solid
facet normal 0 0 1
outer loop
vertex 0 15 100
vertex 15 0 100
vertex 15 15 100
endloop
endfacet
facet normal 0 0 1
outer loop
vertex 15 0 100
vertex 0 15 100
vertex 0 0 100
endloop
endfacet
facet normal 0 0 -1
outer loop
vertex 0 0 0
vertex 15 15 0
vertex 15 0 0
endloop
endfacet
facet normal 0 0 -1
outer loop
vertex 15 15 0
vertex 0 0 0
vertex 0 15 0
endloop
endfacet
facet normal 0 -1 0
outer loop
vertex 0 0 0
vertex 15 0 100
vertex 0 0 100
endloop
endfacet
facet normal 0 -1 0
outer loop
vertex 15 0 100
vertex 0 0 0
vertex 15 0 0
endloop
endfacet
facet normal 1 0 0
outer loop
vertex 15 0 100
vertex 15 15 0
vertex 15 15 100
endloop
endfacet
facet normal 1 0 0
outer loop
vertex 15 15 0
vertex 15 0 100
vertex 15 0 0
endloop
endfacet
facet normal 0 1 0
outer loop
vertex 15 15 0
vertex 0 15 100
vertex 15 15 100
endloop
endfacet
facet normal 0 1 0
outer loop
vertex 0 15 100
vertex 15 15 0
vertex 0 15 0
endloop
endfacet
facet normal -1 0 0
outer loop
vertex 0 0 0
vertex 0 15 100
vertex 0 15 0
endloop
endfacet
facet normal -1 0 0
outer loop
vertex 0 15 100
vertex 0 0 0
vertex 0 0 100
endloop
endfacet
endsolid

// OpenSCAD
$fn = 64;

length = 100;
size = 15;

color([0.75, 0.78, 0.82])
cube([size, size, length], center=false);
